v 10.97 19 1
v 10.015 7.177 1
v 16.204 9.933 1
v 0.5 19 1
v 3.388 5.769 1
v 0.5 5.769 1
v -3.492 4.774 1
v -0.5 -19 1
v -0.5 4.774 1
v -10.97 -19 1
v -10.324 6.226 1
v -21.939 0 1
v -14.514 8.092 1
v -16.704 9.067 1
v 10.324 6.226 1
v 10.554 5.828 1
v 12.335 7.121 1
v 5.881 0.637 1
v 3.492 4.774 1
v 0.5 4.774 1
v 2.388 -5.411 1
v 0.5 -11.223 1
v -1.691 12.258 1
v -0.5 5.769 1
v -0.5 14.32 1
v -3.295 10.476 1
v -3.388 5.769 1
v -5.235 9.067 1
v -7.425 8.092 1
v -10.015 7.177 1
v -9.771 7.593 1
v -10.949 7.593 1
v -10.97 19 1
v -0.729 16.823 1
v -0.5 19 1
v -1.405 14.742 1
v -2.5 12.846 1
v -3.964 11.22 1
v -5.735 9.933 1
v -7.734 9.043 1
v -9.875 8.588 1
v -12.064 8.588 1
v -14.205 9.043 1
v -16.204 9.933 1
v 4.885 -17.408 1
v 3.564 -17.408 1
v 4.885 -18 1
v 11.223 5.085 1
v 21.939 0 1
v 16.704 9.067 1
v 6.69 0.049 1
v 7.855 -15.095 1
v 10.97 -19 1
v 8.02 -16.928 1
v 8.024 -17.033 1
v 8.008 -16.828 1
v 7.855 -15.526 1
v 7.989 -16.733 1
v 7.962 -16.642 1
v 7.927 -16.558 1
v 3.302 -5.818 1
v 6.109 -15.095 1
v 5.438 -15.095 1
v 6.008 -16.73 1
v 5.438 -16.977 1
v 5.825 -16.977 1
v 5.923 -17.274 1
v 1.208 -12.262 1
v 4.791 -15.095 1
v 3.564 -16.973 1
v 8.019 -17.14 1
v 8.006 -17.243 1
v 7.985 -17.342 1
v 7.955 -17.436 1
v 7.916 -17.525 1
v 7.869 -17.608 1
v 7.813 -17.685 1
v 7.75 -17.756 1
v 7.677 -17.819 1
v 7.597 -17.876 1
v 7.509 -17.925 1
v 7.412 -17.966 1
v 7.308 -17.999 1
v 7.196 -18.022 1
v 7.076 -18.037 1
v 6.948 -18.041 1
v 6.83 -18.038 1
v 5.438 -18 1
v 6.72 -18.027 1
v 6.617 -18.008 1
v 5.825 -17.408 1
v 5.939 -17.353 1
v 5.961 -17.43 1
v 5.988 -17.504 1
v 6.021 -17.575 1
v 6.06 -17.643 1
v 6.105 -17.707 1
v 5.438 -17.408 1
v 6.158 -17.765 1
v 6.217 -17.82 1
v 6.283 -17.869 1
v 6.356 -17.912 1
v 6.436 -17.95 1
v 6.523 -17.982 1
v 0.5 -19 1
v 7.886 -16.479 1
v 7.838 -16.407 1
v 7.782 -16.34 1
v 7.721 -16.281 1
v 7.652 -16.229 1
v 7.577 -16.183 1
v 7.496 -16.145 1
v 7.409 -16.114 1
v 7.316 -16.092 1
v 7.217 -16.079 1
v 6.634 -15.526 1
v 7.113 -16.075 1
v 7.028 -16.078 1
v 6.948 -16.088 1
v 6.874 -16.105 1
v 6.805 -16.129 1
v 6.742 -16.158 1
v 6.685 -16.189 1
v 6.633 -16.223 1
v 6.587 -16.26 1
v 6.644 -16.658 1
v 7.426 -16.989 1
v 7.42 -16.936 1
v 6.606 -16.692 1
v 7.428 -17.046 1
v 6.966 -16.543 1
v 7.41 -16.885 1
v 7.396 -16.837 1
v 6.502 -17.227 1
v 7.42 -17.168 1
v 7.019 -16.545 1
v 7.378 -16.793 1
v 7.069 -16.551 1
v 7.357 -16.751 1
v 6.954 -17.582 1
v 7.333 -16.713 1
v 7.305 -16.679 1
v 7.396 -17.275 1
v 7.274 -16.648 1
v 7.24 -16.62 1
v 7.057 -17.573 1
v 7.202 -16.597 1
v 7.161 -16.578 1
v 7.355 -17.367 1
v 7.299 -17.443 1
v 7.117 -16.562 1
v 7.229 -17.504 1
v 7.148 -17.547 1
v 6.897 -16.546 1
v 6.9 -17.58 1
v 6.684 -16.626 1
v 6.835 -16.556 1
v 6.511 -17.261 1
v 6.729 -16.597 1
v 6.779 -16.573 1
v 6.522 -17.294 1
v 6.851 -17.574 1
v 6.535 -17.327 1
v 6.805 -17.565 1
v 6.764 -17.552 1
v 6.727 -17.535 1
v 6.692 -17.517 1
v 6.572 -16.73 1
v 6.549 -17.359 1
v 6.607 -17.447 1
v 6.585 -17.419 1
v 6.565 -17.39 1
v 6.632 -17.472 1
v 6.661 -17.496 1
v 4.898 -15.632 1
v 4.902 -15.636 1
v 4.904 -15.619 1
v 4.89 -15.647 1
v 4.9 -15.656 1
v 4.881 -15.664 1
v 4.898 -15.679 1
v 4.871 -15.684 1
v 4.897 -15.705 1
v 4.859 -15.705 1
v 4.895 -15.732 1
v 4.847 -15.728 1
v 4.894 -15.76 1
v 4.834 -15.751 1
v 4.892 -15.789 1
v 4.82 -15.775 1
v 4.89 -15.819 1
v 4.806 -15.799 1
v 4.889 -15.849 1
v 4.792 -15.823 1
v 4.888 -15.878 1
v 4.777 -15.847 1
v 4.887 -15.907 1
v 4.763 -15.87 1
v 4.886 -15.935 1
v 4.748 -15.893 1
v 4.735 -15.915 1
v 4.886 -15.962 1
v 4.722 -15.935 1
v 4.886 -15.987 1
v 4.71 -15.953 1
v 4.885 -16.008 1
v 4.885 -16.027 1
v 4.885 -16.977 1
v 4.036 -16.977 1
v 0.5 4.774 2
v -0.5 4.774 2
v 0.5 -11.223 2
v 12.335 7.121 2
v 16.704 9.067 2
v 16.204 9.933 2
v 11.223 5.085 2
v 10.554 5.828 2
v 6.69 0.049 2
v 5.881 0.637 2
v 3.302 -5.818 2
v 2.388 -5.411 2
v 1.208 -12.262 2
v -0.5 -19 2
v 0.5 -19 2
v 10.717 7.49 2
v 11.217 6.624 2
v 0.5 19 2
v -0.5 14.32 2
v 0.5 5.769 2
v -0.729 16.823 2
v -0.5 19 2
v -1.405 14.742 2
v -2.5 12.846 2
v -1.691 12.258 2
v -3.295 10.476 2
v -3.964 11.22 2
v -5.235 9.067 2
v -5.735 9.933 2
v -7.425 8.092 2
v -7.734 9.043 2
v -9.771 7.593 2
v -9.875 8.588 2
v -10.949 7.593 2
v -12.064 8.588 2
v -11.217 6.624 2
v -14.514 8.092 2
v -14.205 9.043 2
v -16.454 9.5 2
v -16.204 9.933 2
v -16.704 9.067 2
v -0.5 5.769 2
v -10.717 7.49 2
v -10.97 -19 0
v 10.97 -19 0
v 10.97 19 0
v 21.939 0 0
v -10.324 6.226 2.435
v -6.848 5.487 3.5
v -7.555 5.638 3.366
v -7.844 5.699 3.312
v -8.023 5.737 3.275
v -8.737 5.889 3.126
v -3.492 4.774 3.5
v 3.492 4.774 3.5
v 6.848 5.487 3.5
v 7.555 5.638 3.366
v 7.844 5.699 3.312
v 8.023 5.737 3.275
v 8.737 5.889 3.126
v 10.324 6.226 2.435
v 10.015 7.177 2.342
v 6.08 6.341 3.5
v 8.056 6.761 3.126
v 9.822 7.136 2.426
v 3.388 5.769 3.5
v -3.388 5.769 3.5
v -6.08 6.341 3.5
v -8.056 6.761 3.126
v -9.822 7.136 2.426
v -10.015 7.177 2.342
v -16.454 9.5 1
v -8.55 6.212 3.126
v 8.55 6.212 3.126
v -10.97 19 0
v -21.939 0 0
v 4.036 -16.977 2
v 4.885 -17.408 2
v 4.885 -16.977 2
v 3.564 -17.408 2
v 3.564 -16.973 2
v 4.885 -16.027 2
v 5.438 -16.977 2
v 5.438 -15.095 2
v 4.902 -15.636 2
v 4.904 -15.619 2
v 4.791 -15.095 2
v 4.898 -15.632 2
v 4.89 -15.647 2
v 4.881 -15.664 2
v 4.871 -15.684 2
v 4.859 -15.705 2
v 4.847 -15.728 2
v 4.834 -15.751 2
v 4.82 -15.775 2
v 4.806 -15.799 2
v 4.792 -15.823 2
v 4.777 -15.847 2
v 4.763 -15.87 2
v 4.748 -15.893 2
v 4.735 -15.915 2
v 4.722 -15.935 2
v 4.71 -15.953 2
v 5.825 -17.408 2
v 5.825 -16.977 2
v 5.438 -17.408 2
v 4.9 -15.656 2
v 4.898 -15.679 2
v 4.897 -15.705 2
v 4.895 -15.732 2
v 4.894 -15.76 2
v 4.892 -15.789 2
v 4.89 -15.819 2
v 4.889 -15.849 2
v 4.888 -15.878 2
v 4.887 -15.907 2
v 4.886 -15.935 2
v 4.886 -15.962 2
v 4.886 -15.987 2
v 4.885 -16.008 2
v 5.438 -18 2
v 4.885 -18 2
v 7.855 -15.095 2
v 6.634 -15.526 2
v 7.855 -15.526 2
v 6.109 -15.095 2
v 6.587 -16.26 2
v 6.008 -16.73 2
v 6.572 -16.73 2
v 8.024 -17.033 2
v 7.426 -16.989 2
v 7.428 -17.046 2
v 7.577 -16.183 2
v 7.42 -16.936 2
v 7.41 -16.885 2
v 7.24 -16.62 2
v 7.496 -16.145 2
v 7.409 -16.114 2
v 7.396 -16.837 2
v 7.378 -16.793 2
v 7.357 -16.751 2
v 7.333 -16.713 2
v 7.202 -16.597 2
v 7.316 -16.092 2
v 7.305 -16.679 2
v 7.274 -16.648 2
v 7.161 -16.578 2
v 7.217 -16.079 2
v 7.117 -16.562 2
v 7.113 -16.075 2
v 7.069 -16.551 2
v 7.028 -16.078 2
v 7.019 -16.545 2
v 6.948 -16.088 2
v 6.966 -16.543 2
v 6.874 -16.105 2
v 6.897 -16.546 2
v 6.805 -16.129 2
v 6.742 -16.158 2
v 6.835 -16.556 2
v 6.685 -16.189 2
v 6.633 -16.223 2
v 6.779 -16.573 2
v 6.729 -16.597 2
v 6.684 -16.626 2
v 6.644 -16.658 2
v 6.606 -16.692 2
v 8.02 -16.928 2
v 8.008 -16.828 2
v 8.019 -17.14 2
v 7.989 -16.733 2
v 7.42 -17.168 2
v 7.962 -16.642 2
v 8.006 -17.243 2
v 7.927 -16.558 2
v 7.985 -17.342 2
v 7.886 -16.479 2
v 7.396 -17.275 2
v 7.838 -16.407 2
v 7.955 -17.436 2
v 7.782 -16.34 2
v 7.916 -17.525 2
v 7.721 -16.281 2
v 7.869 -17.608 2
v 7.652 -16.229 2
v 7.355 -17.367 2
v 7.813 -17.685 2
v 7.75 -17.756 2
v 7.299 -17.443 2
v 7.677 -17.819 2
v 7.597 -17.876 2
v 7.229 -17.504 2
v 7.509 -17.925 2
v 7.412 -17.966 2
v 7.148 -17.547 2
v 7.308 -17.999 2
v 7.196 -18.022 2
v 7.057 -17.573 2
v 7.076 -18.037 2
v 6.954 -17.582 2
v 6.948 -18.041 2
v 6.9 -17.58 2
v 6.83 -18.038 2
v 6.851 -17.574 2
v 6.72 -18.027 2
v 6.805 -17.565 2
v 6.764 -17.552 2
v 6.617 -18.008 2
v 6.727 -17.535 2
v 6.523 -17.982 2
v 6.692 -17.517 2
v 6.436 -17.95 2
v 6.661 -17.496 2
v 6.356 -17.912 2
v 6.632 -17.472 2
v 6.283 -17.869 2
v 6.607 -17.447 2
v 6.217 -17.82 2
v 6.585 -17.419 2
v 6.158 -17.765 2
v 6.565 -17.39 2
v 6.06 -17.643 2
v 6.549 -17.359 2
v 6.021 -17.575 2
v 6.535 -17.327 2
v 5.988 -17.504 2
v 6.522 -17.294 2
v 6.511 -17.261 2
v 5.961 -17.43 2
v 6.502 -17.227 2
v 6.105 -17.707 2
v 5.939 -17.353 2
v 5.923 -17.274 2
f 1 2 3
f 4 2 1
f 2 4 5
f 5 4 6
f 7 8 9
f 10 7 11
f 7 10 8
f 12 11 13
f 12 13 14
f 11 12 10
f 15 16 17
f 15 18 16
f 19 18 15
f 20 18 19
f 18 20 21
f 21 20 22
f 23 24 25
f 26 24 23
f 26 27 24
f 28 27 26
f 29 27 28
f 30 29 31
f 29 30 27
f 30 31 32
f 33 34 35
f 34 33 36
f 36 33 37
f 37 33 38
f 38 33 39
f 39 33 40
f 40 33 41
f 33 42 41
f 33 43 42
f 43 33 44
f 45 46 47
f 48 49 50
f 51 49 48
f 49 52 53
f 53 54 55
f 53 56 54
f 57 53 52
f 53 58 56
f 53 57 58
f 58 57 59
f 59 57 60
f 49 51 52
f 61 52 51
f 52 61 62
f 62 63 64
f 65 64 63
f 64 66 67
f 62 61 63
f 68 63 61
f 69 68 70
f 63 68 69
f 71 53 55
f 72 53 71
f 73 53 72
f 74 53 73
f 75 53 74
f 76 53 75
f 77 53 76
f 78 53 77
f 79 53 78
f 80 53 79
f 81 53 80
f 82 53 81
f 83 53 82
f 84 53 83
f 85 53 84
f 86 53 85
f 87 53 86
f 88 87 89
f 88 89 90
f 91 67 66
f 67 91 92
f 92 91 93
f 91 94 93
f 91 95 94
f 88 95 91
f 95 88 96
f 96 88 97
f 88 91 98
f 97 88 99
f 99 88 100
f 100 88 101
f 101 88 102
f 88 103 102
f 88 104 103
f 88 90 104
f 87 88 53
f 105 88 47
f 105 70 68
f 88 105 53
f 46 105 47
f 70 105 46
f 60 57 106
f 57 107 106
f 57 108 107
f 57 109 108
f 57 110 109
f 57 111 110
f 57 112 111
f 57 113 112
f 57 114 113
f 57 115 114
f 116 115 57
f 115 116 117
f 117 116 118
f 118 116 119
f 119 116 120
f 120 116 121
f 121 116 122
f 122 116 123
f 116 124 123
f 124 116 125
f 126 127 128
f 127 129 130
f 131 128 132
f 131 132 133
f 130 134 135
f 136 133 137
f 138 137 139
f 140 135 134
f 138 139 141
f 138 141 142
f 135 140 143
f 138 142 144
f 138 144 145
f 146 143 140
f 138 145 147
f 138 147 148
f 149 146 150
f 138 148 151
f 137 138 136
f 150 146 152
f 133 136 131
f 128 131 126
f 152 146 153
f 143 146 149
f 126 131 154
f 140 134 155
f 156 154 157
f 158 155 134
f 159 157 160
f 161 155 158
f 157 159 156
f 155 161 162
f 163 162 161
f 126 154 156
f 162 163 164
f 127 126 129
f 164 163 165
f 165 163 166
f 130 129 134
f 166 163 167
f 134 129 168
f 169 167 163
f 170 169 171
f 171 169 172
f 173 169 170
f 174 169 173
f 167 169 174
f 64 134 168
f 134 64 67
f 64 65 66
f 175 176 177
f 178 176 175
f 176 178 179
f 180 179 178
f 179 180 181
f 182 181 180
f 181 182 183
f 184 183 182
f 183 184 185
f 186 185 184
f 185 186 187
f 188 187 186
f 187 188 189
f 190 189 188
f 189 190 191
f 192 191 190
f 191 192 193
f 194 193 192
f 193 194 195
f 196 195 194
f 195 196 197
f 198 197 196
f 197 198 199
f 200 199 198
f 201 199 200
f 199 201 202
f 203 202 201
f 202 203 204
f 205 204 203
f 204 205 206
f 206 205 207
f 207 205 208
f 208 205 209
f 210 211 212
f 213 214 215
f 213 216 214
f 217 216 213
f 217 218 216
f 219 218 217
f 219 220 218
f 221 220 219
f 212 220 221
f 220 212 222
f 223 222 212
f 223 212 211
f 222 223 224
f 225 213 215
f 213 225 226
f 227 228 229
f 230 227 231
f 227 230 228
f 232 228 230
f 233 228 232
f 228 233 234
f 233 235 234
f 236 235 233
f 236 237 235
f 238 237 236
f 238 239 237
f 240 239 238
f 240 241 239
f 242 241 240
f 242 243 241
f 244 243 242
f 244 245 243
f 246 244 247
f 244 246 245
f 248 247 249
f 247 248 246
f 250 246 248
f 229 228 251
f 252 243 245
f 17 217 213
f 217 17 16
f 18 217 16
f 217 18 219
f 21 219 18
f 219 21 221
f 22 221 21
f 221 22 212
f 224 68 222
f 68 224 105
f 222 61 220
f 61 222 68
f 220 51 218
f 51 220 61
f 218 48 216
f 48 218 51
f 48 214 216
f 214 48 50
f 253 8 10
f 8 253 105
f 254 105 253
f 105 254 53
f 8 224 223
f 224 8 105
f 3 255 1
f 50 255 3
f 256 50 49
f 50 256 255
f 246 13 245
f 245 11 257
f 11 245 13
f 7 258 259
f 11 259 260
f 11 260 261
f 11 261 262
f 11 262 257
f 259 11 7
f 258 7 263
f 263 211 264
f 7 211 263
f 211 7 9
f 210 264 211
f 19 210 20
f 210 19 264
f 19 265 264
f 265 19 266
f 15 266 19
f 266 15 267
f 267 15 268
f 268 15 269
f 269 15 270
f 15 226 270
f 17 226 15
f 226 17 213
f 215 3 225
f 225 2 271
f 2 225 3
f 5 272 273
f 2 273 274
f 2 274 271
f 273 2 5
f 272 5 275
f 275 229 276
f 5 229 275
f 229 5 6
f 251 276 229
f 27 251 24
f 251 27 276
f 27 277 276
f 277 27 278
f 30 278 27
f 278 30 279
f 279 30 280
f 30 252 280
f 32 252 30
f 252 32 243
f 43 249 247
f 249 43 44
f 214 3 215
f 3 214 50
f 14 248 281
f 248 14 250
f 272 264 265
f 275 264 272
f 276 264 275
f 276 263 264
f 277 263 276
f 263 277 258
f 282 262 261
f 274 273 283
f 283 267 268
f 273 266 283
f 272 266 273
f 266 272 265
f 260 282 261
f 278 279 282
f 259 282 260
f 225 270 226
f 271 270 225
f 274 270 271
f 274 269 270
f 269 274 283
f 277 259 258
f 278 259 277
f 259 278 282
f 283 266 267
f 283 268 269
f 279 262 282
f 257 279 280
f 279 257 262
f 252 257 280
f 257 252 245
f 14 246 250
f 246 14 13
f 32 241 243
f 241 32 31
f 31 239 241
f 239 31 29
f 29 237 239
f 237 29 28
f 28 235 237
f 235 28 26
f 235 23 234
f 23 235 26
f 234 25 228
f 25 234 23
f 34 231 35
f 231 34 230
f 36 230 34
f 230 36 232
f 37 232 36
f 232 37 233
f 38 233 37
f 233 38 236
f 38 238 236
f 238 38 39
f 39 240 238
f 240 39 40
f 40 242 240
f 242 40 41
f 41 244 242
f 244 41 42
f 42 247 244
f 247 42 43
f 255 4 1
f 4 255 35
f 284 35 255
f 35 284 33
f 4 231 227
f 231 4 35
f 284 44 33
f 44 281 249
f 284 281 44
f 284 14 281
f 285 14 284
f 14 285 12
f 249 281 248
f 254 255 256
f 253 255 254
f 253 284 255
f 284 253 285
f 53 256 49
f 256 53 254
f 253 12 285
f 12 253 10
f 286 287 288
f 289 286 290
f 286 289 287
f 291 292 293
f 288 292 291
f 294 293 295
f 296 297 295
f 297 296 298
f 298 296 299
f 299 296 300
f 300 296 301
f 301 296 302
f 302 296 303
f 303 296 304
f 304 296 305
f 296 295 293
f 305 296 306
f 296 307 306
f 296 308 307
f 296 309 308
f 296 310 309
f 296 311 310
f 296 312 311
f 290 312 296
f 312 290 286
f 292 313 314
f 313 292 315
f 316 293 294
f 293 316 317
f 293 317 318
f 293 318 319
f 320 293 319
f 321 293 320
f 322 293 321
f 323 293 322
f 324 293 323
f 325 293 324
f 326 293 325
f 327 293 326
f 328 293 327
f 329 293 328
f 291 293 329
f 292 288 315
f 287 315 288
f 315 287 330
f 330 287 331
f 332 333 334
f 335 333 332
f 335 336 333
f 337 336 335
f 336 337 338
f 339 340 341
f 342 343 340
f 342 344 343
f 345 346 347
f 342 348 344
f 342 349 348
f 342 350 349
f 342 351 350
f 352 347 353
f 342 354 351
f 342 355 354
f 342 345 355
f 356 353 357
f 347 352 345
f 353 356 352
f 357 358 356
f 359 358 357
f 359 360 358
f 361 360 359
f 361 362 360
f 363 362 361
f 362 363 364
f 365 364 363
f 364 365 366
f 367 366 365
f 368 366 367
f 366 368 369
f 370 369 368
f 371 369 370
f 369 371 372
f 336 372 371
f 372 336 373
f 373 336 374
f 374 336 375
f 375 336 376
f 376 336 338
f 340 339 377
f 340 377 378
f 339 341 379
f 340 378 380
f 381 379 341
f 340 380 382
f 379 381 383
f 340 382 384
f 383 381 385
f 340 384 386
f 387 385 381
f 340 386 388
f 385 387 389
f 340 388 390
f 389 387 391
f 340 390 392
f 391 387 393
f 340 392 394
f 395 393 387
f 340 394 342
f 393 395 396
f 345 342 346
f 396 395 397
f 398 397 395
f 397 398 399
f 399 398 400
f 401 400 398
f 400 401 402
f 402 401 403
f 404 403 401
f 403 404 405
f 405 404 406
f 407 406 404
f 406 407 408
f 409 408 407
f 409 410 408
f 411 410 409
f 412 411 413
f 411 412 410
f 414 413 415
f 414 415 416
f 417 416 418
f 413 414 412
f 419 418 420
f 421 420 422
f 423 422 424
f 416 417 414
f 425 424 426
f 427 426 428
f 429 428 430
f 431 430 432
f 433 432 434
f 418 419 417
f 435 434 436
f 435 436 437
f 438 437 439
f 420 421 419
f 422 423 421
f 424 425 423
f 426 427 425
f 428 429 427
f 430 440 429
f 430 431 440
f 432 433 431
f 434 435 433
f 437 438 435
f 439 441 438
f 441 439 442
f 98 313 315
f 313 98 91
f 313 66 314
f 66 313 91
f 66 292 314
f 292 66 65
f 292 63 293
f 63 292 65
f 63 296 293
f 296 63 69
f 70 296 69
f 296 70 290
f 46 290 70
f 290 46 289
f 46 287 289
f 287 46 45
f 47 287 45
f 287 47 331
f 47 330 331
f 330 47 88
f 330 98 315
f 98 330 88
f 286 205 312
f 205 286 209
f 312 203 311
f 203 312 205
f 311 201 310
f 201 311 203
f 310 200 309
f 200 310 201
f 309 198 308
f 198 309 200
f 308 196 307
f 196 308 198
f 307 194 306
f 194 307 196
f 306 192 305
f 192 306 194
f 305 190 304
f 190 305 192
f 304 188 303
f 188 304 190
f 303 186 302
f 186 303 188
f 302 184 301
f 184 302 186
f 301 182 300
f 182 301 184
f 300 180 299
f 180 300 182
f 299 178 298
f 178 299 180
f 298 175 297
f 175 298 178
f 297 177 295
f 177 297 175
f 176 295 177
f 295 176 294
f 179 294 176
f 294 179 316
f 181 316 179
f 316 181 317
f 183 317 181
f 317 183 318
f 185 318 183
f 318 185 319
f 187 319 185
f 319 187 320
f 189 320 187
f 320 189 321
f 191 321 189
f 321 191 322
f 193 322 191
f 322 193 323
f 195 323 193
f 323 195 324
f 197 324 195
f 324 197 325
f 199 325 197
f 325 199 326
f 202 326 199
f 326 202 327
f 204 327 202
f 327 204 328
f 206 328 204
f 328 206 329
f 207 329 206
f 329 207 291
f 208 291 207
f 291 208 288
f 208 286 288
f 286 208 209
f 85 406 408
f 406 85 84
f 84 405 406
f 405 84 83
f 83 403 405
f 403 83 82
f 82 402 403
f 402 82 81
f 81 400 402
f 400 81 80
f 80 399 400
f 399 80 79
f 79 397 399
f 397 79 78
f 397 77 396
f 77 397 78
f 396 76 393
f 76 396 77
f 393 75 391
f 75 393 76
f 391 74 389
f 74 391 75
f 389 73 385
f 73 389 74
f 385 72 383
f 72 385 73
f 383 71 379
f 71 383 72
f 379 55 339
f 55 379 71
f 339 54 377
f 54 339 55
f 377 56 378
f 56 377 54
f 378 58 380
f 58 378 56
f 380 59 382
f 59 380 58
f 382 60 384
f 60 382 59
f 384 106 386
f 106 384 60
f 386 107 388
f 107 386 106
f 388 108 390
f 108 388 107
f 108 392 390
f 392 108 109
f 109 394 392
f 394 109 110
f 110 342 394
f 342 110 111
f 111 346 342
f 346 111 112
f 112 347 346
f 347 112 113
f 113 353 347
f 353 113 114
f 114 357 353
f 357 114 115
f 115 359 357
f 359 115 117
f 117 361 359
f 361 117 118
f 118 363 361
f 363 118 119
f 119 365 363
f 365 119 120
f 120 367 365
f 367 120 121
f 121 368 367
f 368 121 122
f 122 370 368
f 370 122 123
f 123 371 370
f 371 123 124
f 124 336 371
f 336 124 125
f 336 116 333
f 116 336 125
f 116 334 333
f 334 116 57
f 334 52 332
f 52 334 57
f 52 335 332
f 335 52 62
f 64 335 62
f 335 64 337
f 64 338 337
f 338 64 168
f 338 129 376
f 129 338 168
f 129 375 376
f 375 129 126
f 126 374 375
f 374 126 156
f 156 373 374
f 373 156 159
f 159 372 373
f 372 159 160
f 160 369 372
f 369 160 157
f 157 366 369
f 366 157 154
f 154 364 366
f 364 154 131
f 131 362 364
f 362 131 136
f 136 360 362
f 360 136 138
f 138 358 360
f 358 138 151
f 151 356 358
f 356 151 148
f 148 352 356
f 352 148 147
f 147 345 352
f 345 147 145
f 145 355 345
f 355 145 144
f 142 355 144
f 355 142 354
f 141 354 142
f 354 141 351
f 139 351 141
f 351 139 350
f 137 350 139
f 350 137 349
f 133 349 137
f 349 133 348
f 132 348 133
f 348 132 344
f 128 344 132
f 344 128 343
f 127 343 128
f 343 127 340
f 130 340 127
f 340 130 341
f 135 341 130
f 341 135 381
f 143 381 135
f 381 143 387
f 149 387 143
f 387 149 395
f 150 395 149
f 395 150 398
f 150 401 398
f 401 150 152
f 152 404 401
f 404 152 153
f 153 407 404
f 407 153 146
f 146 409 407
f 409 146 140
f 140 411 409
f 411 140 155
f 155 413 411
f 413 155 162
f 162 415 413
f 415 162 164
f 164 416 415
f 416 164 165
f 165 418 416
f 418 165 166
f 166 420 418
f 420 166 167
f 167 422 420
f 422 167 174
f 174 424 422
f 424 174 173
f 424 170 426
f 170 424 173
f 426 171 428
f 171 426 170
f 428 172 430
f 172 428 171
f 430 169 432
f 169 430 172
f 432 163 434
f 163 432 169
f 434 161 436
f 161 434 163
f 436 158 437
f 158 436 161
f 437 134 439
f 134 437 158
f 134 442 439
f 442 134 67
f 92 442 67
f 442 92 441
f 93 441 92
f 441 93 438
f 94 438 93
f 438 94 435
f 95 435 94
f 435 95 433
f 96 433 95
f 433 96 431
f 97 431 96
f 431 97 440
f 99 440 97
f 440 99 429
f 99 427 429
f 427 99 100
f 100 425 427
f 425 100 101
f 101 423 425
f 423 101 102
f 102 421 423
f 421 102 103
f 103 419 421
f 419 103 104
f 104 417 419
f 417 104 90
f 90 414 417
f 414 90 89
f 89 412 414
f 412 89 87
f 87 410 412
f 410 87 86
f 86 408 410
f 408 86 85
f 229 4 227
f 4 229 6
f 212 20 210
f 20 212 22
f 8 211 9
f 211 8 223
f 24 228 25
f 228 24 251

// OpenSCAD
include <../Scripts/18xx tiles basic functions.scad>
hex("Brown");
put_tilenr("45");
light_curve();
straight_line();
light_curve_bridge(r=2);
sharp_curve(r=3);
